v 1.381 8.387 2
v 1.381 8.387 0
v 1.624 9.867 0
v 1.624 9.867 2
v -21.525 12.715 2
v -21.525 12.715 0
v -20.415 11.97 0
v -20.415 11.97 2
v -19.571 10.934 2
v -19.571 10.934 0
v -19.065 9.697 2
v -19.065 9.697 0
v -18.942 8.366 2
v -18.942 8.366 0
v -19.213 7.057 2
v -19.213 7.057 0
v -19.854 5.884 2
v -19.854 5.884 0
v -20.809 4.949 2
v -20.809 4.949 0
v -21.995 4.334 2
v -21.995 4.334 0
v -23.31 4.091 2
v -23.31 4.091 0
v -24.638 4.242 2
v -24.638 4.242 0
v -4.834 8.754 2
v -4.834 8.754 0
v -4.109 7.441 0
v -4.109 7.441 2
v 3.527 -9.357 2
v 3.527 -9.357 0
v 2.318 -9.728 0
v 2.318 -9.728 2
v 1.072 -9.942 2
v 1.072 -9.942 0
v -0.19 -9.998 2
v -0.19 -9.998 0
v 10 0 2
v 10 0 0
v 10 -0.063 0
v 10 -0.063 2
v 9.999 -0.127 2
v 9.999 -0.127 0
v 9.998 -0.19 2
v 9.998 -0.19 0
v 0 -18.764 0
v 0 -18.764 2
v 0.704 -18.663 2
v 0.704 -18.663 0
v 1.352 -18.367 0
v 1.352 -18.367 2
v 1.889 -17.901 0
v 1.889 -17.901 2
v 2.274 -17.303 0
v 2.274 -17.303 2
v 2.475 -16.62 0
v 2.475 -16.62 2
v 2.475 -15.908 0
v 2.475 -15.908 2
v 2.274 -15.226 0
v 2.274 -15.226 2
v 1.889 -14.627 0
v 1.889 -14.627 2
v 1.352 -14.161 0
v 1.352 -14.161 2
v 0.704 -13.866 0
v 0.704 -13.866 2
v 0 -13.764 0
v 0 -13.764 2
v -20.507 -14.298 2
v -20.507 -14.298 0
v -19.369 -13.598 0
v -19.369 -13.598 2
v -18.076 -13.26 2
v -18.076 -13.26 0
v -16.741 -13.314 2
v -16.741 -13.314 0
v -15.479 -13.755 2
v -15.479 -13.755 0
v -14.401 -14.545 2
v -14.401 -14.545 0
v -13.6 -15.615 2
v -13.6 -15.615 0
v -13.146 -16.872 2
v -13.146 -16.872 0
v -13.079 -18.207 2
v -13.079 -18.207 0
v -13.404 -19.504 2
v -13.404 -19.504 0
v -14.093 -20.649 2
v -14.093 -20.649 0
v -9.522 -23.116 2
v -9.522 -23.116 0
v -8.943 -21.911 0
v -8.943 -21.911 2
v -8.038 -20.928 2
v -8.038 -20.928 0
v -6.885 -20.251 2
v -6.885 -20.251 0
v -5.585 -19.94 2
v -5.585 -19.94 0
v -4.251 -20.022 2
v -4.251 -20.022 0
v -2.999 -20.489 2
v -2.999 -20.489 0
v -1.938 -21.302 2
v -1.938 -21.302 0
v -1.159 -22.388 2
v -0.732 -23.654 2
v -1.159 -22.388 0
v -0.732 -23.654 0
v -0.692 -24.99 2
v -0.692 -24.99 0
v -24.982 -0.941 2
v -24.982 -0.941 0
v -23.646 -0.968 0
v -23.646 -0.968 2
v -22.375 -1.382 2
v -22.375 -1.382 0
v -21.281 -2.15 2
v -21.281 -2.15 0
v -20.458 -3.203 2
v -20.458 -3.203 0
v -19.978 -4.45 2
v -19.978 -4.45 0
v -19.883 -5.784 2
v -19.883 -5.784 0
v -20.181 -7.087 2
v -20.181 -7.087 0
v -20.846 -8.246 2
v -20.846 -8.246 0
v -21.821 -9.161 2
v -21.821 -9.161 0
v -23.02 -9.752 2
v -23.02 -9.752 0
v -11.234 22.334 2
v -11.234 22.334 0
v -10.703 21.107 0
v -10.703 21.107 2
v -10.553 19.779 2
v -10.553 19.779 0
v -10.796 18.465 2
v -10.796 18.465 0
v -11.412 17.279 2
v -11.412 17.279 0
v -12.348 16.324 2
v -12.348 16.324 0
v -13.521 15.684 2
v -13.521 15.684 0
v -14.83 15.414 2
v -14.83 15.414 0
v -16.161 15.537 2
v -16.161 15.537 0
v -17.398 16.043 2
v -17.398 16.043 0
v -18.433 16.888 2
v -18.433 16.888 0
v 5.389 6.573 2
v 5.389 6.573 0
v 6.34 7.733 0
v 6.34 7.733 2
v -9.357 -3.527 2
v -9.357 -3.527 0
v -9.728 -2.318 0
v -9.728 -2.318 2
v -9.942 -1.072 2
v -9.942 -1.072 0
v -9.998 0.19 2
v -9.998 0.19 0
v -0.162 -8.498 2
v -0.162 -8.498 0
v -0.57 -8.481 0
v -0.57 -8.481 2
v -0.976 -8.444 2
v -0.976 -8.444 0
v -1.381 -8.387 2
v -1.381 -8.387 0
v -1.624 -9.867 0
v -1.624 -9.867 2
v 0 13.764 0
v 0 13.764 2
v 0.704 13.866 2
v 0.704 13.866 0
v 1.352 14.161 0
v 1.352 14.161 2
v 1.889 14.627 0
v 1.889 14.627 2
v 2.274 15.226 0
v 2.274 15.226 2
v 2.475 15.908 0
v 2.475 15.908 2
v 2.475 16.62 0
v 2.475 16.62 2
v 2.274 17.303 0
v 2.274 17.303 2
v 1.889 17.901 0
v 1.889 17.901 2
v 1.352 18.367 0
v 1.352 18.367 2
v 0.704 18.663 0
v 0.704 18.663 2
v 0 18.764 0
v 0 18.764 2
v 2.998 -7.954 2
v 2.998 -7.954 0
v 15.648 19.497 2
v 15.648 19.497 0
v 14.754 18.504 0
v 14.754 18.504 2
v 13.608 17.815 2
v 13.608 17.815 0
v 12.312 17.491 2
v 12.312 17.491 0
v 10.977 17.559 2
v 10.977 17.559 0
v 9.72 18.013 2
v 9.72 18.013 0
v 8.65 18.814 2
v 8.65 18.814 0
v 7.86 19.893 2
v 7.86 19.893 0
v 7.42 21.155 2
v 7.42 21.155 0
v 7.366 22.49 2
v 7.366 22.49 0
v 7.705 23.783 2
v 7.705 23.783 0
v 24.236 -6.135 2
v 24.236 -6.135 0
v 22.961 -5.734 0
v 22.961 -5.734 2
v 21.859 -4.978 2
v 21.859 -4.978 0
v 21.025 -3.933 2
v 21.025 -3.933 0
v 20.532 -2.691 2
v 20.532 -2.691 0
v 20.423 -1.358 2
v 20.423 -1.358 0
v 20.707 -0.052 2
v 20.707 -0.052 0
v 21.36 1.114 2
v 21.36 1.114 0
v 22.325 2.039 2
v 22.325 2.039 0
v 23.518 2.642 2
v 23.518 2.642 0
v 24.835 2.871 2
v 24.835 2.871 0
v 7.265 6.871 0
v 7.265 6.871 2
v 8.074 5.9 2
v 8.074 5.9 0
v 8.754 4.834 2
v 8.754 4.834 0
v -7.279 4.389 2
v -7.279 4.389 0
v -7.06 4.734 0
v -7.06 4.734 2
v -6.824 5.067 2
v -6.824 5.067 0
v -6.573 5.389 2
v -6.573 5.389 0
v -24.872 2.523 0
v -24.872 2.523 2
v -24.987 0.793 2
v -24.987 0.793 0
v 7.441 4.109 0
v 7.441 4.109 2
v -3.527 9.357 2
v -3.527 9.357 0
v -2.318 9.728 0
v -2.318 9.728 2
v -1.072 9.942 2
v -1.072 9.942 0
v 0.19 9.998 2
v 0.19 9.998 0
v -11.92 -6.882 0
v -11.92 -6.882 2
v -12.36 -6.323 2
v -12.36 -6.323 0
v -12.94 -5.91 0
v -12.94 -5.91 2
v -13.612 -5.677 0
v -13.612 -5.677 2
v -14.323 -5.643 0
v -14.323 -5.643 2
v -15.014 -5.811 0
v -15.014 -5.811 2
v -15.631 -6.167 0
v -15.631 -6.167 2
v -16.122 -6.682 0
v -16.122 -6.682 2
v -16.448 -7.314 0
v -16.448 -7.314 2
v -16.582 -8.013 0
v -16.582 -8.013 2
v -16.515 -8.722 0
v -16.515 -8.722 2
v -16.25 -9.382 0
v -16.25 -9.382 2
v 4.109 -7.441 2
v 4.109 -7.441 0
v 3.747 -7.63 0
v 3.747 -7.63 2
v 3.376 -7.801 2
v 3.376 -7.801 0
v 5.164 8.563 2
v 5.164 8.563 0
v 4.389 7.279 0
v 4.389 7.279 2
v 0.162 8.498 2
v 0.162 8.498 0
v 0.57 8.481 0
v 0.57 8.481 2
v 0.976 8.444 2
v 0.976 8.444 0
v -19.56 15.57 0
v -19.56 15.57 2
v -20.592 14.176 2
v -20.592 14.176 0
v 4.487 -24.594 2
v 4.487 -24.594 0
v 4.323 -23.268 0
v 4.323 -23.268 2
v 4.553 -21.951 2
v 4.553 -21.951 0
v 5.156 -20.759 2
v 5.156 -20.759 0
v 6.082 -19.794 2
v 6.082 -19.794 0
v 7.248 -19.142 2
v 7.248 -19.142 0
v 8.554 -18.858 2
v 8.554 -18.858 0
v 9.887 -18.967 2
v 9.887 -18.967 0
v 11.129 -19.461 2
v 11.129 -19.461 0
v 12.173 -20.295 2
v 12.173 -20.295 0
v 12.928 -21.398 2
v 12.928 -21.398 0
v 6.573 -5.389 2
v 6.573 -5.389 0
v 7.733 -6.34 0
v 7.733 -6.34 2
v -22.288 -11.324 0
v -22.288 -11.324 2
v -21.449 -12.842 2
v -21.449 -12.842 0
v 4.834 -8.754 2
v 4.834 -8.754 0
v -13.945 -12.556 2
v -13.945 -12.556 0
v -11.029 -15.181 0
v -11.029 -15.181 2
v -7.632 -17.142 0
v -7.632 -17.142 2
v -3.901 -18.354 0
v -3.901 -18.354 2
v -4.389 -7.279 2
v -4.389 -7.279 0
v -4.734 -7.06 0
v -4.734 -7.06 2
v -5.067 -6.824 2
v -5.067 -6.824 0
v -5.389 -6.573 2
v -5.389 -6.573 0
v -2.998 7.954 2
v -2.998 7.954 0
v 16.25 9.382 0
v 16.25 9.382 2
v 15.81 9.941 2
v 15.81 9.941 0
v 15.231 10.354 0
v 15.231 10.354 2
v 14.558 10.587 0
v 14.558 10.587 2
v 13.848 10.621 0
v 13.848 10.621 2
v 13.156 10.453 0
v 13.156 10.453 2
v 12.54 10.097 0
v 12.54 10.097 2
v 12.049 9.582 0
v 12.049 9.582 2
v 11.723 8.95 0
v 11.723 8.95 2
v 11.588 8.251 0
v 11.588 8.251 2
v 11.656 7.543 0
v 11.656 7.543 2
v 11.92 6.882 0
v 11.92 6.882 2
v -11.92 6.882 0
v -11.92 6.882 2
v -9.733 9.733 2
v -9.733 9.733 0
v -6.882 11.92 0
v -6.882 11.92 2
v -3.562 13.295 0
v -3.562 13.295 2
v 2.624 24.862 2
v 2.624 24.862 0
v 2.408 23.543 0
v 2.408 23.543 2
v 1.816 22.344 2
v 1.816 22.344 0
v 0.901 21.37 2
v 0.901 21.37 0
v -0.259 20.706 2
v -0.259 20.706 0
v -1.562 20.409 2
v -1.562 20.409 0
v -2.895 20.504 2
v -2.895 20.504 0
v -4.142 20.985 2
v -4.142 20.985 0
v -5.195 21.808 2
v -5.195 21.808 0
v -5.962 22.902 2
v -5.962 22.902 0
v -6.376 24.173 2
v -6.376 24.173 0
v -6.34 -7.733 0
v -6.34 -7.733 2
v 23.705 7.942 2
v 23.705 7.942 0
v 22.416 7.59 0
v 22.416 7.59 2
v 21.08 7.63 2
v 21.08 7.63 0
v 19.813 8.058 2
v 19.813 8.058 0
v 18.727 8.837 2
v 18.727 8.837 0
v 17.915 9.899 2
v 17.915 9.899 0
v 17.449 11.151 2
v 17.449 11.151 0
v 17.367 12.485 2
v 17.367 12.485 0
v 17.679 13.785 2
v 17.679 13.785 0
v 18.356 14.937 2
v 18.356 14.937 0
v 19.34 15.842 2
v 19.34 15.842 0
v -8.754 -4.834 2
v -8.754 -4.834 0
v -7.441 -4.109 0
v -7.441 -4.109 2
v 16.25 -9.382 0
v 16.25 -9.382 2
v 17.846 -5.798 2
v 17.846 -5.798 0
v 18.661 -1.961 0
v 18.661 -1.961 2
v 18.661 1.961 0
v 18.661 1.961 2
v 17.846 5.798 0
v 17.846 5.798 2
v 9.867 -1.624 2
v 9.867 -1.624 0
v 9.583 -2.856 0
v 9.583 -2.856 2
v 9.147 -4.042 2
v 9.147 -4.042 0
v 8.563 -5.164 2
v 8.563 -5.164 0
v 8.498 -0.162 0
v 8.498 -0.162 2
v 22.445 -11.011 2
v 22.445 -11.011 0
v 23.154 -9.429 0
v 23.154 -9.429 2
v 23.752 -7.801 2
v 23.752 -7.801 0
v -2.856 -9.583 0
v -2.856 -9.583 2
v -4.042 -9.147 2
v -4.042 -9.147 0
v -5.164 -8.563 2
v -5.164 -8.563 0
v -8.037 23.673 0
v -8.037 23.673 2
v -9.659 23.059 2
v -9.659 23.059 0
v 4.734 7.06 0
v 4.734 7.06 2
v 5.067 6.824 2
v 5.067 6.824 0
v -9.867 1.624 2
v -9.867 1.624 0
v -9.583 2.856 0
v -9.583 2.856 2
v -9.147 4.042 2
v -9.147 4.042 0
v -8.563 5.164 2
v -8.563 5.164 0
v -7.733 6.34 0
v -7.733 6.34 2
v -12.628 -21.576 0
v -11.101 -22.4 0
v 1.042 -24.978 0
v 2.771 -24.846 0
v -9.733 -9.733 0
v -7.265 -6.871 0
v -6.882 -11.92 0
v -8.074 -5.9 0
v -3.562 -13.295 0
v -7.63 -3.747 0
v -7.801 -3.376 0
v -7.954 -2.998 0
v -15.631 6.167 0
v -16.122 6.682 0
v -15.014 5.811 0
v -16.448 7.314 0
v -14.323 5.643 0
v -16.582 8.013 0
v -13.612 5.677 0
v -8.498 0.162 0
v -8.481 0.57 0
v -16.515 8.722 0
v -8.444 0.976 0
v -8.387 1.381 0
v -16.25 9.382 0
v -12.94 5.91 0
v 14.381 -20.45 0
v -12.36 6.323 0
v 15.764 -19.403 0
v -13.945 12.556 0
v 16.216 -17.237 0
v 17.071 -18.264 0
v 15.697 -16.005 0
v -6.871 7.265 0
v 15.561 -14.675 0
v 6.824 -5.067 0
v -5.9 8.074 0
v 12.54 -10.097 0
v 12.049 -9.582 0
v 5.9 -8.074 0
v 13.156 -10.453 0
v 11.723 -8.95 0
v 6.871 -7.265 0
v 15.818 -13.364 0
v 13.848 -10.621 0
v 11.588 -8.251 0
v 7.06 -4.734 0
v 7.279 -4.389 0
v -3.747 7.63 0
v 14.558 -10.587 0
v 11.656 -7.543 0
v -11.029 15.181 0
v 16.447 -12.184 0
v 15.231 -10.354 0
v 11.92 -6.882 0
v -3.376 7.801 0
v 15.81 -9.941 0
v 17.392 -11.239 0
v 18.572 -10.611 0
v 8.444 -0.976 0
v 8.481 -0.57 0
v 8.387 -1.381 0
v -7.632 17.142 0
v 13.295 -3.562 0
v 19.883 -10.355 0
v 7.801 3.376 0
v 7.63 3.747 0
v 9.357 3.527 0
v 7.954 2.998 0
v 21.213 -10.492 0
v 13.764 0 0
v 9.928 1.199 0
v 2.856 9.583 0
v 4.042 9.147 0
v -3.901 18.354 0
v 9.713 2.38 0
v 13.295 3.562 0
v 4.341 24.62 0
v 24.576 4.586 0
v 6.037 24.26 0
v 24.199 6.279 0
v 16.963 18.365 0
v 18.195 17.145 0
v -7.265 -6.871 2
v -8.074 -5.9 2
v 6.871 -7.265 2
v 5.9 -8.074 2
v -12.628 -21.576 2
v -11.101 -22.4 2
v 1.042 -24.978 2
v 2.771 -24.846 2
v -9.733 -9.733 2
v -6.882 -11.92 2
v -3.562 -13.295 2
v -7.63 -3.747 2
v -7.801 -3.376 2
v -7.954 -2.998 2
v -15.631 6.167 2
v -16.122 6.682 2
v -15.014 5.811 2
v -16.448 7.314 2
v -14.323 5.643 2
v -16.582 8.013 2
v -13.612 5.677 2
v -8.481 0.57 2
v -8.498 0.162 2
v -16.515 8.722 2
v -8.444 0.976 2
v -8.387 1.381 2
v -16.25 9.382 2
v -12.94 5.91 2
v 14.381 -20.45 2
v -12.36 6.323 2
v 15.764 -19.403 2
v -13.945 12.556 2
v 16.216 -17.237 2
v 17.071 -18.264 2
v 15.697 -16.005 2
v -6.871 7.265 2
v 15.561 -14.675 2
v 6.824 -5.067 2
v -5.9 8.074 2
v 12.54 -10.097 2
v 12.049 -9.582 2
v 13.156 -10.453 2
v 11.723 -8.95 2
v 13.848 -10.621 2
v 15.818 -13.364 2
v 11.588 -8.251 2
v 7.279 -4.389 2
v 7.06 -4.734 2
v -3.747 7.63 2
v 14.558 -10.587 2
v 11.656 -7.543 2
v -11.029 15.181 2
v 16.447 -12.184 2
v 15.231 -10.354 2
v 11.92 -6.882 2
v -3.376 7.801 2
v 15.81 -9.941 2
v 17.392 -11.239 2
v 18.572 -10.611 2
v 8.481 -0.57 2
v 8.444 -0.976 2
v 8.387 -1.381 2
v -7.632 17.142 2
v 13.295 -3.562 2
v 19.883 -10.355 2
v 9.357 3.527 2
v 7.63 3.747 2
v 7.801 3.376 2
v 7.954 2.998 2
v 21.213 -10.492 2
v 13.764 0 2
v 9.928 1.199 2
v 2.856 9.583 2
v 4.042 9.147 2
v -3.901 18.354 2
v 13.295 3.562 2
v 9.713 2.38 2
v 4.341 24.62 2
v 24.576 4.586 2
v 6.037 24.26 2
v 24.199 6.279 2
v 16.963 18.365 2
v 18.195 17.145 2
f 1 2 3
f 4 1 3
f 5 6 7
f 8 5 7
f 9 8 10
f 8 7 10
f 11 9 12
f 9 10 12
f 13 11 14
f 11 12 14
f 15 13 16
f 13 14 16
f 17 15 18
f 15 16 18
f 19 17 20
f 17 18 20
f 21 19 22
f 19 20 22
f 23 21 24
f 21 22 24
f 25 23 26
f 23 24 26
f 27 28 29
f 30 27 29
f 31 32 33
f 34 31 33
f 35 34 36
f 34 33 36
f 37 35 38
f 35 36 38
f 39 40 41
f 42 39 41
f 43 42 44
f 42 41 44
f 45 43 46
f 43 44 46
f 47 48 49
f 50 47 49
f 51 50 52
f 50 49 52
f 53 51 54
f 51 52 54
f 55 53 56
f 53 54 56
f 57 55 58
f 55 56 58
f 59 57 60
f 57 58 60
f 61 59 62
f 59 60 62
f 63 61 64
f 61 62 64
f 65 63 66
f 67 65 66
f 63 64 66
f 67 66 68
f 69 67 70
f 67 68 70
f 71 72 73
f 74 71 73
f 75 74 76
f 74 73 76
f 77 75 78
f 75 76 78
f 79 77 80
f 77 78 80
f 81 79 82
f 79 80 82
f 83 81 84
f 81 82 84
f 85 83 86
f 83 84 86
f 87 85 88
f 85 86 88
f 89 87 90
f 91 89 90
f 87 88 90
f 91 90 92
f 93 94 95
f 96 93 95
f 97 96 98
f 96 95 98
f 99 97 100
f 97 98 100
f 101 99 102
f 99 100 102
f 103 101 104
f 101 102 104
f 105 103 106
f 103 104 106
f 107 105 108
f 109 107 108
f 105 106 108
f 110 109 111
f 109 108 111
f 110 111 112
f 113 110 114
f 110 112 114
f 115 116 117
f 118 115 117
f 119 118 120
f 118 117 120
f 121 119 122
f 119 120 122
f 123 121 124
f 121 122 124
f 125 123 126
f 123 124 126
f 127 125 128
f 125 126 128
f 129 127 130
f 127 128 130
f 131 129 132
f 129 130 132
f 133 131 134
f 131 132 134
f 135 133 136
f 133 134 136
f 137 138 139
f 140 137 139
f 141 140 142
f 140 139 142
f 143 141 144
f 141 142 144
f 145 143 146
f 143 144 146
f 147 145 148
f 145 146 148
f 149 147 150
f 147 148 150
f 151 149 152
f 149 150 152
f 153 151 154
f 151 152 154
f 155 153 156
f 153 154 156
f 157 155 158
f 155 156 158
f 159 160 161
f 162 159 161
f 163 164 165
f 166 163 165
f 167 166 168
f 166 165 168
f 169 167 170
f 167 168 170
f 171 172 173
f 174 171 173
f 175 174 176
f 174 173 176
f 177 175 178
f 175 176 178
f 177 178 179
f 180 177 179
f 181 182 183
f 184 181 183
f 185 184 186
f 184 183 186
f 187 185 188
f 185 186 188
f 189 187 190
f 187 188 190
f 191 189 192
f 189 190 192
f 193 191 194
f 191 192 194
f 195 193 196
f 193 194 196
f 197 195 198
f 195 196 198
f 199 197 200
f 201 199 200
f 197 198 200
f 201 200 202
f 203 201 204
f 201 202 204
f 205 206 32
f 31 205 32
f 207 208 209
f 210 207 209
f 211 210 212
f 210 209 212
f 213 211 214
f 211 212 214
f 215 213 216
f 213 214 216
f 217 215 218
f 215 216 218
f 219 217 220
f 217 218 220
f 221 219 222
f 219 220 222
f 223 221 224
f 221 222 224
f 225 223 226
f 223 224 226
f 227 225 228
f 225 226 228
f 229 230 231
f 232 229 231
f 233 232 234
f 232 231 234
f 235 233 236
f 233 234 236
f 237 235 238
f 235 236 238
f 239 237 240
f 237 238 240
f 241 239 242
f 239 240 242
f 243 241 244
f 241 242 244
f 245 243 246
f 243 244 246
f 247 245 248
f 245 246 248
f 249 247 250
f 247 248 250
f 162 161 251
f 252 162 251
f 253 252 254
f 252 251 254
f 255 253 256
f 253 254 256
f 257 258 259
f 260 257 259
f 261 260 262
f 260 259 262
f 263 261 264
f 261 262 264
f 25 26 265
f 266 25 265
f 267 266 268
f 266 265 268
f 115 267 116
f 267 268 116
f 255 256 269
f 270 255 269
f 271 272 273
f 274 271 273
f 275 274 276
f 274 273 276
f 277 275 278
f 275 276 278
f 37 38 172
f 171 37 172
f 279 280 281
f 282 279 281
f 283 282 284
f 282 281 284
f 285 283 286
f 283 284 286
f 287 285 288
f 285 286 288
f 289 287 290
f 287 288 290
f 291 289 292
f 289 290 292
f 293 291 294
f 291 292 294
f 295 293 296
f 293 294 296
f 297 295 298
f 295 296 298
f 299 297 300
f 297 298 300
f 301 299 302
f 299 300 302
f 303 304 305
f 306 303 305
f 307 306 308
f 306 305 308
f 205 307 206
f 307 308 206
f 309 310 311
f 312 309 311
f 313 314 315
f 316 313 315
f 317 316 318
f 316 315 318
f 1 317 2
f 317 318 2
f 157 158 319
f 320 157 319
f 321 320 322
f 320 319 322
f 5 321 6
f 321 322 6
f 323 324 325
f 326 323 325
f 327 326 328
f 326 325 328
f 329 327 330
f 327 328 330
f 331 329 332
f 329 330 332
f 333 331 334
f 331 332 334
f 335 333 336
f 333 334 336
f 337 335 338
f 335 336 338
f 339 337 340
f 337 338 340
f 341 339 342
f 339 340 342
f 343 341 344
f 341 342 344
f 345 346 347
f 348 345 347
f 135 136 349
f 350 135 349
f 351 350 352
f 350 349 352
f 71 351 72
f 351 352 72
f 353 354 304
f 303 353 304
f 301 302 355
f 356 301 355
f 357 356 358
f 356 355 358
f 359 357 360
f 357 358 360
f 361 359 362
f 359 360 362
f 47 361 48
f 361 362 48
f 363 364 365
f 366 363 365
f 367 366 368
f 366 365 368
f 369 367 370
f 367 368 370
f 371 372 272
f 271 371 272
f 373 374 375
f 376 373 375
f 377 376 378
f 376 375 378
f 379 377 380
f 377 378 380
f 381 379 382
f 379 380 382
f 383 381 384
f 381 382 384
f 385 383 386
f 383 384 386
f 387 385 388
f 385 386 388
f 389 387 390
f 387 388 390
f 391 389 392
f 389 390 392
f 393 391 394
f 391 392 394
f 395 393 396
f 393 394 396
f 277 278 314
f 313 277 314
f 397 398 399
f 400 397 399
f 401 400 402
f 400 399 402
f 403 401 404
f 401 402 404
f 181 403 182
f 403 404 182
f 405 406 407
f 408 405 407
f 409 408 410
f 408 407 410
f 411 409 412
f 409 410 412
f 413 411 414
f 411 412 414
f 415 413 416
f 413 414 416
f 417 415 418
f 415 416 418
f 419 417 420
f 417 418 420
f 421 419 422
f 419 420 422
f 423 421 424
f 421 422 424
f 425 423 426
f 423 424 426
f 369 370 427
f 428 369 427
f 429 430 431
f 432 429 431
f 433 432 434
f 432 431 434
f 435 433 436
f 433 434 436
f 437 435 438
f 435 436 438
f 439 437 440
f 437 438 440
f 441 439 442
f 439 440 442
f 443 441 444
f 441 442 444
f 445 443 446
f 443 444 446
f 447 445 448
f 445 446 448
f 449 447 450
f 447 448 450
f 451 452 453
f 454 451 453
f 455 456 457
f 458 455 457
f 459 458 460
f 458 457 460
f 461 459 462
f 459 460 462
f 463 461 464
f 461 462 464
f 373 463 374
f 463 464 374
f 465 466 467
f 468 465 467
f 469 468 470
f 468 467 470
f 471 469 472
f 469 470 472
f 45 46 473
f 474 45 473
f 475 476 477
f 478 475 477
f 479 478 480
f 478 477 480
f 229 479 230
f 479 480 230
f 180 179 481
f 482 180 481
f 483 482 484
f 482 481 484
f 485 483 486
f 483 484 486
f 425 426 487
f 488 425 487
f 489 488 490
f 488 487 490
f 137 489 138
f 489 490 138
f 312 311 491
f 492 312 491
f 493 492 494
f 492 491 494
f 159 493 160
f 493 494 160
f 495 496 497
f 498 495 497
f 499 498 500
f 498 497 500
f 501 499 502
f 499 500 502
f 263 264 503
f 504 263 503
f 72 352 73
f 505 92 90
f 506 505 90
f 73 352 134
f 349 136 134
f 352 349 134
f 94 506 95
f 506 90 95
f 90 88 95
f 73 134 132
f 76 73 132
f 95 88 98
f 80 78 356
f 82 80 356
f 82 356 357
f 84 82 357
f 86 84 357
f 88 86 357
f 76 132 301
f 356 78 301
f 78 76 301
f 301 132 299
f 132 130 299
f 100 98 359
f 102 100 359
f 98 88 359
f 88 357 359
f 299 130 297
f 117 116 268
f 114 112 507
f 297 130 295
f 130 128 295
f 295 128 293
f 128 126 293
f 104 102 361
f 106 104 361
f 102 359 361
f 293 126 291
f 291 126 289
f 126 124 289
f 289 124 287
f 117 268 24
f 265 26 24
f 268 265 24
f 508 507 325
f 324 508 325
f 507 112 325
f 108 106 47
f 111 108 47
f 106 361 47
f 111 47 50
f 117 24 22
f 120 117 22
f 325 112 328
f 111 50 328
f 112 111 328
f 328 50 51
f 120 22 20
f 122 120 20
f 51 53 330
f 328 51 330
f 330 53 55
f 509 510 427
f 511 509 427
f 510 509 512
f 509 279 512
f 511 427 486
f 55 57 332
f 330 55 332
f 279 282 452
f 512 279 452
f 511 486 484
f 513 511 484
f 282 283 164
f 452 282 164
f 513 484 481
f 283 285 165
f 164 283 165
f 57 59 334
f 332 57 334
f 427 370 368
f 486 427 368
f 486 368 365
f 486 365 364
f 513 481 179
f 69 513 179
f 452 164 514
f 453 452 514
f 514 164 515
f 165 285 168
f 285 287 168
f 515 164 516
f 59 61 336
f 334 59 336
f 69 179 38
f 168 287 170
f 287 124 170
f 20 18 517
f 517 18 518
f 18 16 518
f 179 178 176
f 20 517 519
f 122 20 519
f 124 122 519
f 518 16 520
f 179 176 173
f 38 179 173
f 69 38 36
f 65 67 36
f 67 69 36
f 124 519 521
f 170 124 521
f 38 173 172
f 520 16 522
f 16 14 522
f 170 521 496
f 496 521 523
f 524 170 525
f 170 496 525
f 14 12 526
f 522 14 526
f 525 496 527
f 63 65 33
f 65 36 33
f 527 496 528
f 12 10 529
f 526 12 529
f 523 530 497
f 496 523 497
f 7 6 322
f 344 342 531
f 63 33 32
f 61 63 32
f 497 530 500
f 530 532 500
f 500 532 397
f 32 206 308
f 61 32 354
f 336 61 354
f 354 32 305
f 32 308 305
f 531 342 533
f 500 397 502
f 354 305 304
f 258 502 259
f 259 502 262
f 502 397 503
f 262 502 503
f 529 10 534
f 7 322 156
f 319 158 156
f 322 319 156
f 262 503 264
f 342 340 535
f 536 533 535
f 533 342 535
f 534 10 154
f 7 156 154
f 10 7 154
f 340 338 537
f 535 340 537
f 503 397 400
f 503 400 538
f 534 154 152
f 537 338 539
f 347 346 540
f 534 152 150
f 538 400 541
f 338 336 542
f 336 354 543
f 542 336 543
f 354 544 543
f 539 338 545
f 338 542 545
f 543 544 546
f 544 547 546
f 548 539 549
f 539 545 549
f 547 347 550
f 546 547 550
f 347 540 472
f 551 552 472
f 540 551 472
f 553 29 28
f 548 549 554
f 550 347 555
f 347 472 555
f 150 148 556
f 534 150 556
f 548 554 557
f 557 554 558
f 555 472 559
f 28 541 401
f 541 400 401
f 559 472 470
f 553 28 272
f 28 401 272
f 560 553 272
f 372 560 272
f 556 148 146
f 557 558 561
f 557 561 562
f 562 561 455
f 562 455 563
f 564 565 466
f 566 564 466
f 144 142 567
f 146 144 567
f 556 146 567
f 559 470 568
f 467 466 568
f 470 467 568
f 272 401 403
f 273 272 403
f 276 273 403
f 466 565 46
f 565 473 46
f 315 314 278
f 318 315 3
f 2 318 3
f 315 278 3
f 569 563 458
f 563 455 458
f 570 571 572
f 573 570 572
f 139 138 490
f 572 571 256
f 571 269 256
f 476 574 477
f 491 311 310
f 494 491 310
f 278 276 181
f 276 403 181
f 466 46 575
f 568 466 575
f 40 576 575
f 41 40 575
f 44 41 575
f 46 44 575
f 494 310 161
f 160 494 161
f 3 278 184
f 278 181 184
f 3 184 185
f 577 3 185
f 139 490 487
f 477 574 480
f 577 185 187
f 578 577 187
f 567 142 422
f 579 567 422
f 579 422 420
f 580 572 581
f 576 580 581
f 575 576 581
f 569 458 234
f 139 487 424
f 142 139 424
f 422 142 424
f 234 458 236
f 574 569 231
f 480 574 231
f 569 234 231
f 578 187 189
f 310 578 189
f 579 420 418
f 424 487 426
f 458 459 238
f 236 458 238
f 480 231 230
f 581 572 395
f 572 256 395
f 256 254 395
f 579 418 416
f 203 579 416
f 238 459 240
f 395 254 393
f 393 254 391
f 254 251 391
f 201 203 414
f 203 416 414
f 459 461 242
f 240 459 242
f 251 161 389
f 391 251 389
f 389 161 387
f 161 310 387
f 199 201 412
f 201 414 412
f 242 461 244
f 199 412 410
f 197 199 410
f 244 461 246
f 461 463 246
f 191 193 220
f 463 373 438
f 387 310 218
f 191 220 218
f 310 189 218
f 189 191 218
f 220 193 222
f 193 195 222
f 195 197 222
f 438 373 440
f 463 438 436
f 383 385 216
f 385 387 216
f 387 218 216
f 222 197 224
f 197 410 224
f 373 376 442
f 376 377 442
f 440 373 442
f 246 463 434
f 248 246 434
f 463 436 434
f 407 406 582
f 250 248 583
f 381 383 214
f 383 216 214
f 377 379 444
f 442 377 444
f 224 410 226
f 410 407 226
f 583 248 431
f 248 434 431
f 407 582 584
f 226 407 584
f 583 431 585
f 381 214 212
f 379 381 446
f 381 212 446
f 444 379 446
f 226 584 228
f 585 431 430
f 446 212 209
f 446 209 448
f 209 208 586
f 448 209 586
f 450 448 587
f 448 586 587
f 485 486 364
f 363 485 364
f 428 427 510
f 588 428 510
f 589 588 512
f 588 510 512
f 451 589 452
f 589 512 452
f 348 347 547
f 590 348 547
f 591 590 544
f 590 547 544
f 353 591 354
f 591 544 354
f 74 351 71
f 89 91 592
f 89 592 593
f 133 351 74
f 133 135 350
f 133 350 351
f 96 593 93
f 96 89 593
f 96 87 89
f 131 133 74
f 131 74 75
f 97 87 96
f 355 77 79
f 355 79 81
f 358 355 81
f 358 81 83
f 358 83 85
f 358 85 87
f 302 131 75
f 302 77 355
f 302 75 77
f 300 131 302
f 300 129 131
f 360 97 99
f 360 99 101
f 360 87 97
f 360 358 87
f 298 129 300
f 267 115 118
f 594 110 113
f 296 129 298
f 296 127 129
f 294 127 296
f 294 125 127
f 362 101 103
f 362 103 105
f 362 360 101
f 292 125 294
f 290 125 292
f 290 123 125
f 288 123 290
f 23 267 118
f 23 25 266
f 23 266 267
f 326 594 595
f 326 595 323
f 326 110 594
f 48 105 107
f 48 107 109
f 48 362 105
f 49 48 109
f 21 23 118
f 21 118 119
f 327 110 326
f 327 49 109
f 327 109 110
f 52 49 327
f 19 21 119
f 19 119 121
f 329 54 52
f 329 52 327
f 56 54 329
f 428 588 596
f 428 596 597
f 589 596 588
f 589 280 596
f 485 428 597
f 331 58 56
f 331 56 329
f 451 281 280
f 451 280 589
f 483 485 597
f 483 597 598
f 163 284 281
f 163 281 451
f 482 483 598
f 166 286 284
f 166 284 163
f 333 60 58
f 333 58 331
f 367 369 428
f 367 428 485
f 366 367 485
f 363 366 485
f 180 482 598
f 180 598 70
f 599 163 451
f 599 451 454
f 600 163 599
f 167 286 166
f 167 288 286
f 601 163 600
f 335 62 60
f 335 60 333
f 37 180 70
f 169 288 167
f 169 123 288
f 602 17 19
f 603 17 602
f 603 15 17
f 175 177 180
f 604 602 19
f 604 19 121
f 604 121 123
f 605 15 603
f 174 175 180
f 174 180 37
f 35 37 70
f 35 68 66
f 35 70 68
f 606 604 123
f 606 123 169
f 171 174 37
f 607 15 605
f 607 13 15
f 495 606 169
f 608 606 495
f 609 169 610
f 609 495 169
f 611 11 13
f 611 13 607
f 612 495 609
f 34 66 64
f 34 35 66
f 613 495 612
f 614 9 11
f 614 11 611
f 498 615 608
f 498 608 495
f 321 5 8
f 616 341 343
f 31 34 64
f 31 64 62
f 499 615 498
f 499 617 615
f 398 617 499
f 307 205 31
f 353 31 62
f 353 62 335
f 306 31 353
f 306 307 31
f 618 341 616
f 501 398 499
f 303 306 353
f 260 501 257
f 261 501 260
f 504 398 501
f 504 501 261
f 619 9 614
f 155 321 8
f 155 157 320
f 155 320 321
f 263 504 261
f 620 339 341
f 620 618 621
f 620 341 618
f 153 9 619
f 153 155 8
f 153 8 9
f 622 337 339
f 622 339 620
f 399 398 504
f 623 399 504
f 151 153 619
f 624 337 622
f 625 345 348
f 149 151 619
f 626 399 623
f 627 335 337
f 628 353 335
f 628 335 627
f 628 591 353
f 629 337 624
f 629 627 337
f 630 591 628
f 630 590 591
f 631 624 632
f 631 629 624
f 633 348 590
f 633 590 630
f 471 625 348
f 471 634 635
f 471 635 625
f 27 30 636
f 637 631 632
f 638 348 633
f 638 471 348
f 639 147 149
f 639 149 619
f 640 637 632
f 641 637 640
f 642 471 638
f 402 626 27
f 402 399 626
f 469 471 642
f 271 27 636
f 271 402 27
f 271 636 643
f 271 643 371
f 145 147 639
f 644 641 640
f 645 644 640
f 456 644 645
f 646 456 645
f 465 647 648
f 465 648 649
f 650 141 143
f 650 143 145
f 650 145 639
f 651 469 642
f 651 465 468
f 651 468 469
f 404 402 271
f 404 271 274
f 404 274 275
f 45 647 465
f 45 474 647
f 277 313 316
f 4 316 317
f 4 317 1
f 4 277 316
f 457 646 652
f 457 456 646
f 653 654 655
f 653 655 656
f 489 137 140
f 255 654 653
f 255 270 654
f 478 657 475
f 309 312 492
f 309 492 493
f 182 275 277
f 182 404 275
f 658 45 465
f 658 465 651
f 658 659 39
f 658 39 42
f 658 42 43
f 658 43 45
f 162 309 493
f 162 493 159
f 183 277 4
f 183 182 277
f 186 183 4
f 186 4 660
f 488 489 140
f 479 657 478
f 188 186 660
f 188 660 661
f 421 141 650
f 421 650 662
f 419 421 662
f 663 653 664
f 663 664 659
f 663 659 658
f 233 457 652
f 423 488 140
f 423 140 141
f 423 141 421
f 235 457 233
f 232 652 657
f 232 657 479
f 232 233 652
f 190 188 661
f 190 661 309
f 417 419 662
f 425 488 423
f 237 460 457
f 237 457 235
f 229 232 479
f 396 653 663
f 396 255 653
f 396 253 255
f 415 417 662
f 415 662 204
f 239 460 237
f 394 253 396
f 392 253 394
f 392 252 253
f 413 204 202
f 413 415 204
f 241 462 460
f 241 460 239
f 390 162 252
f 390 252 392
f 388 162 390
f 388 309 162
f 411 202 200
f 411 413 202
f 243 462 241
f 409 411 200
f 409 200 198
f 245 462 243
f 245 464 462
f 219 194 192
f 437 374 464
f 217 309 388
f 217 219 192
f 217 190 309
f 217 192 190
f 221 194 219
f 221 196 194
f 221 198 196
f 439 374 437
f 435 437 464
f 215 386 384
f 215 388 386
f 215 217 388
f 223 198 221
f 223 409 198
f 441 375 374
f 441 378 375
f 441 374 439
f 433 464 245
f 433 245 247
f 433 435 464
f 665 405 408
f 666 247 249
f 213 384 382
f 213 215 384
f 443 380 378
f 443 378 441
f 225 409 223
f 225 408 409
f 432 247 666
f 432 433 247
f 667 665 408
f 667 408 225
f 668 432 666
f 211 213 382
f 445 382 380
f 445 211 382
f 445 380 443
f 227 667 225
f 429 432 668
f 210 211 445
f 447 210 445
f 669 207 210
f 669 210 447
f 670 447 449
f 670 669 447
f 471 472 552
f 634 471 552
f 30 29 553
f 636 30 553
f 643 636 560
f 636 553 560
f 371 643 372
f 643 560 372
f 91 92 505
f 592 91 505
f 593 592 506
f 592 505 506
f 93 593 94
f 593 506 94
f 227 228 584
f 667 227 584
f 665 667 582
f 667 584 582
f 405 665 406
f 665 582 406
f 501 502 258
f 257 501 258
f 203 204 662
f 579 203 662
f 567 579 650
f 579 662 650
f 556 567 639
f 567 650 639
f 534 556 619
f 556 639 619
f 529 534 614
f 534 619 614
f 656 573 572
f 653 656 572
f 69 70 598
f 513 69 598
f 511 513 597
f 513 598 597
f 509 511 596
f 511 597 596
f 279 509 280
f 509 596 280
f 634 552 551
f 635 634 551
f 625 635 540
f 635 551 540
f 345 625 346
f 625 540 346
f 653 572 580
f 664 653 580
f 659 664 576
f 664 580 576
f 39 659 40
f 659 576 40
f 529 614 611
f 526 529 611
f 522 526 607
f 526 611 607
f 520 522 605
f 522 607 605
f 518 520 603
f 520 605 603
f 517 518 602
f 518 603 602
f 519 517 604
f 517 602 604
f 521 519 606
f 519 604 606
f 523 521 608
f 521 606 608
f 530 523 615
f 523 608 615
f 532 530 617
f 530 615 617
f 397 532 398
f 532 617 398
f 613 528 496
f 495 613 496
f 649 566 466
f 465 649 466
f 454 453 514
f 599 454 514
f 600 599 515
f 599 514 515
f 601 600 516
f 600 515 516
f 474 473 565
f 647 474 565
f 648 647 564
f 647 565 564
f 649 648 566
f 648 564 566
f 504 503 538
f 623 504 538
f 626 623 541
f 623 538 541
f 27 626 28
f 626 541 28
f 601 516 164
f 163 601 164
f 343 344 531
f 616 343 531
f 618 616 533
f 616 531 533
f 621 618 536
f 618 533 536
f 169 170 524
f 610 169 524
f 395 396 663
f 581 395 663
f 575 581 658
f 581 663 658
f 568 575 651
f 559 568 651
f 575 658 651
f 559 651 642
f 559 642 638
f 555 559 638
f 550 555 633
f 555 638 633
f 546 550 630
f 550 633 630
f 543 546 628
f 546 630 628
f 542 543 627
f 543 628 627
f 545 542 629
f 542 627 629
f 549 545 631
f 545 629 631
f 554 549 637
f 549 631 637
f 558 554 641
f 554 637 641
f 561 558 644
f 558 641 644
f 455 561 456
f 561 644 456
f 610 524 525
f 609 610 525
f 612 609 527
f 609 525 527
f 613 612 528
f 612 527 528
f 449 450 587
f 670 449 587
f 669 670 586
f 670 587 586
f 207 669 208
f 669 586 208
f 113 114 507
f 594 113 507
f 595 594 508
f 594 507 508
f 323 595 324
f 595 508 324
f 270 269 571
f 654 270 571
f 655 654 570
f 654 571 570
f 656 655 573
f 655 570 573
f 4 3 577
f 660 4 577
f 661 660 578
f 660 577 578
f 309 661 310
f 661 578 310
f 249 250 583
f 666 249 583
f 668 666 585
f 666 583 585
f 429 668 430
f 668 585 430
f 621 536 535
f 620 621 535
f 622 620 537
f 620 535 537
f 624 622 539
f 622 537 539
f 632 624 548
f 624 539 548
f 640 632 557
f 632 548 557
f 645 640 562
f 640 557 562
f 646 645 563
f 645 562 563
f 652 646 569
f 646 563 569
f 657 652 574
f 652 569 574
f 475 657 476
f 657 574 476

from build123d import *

# Parameters (mm, degrees)
F1_DEPTH = 2
F2_DEPTH = 2
F4_DEPTH = 2


with BuildPart() as f1:
    # F0 (on Top) → F1 (new body)
    with BuildSketch(Plane.XY):
        with BuildLine():
            ThreePointArc((24.235519, -6.135113), (20.423062, -1.358402), (24.834565, 2.871307))
            ThreePointArc((24.834565, 2.871307), (24.40188, 5.435831), (23.705109, 7.941526))
            ThreePointArc((23.705109, 7.941526), (17.91538, 9.89878), (19.33982, 15.842076))
            ThreePointArc((19.33982, 15.842076), (17.589336, 17.765564), (15.648493, 19.496786))
            ThreePointArc((15.648493, 19.496786), (9.719693, 18.01317), (7.704819, 23.783098))
            ThreePointArc((7.704819, 23.783098), (5.192302, 24.454856), (2.623592, 24.861954))
            ThreePointArc((2.623592, 24.861954), (-1.561929, 20.408505), (-6.376408, 24.173155))
            ThreePointArc((-6.376408, 24.173155), (-8.853251, 23.379905), (-11.234281, 22.333628))
            ThreePointArc((-11.234281, 22.333628), (-12.347649, 16.324284), (-18.43317, 16.888406))
            ThreePointArc((-18.43317, 16.888406), (-20.08796, 14.881998), (-21.525349, 12.714532))
            ThreePointArc((-21.525349, 12.714532), (-19.213078, 7.057219), (-24.637531, 4.241707))
            ThreePointArc((-24.637531, 4.241707), (-24.944883, 1.659163), (-24.982271, -0.941337))
            ThreePointArc((-24.982271, -0.941337), (-19.97849, -4.450464), (-23.01965, -9.751704))
            ThreePointArc((-23.01965, -9.751704), (-21.881982, -12.090445), (-20.507499, -14.298339))
            ThreePointArc((-20.507499, -14.298339), (-14.400873, -14.545156), (-14.093192, -20.649018))
            ThreePointArc((-14.093192, -20.649018), (-11.871706, -22.001422), (-9.52174, -23.115719))
            ThreePointArc((-9.52174, -23.115719), (-4.25108, -20.021864), (-0.692246, -24.990414))
            ThreePointArc((-0.692246, -24.990414), (1.907752, -24.927103), (4.487104, -24.594022))
            ThreePointArc((4.487104, -24.594022), (7.2484, -19.141771), (12.928483, -21.397531))
            ThreePointArc((12.928483, -21.397531), (15.081513, -19.938605), (17.071324, -18.263896))
            ThreePointArc((17.071324, -18.263896), (16.446565, -12.184301), (22.444511, -11.011082))
            ThreePointArc((22.444511, -11.011082), (23.467, -8.619741), (24.235519, -6.135113))
        make_face()
        with BuildLine():
            ThreePointArc((9.357447, 3.52678), (9.83805, 1.792418), (10, 0))
            ThreePointArc((10, 0), (9.999547, -0.095211), (9.998187, -0.190414))
            ThreePointArc((9.998187, -0.190414), (9.958528, -0.909789), (9.867177, -1.624442))
            ThreePointArc((9.867177, -1.624442), (9.383729, -3.456246), (8.563477, -5.163997))
            ThreePointArc((8.563477, -5.163997), (8.169444, -5.767165), (7.733005, -6.340397))
            ThreePointArc((7.733005, -6.340397), (6.398425, -7.685061), (4.83419, -8.753891))
            ThreePointArc((4.83419, -8.753891), (4.191363, -9.079233), (3.52678, -9.357447))
            ThreePointArc((3.52678, -9.357447), (1.698668, -9.85467), (-0.190414, -9.998187))
            ThreePointArc((-0.190414, -9.998187), (-0.909789, -9.958528), (-1.624442, -9.867177))
            ThreePointArc((-1.624442, -9.867177), (-3.456246, -9.383729), (-5.163997, -8.563477))
            ThreePointArc((-5.163997, -8.563477), (-5.767165, -8.169444), (-6.340397, -7.733005))
            ThreePointArc((-6.340397, -7.733005), (-7.685061, -6.398425), (-8.753891, -4.83419))
            ThreePointArc((-8.753891, -4.83419), (-9.079233, -4.191363), (-9.357447, -3.52678))
            ThreePointArc((-9.357447, -3.52678), (-9.85467, -1.698668), (-9.998187, 0.190414))
            ThreePointArc((-9.998187, 0.190414), (-9.958528, 0.909789), (-9.867177, 1.624442))
            ThreePointArc((-9.867177, 1.624442), (-9.383729, 3.456246), (-8.563477, 5.163997))
            ThreePointArc((-8.563477, 5.163997), (-8.169444, 5.767165), (-7.733005, 6.340397))
            ThreePointArc((-7.733005, 6.340397), (-6.398425, 7.685061), (-4.83419, 8.753891))
            ThreePointArc((-4.83419, 8.753891), (-4.191363, 9.079233), (-3.52678, 9.357447))
            ThreePointArc((-3.52678, 9.357447), (-1.698668, 9.85467), (0.190414, 9.998187))
            ThreePointArc((0.190414, 9.998187), (0.909789, 9.958528), (1.624442, 9.867177))
            ThreePointArc((1.624442, 9.867177), (3.456246, 9.383729), (5.163997, 8.563477))
            ThreePointArc((5.163997, 8.563477), (5.767165, 8.169444), (6.340397, 7.733005))
            ThreePointArc((6.340397, 7.733005), (7.685061, 6.398425), (8.753891, 4.83419))
            ThreePointArc((8.753891, 4.83419), (9.079233, 4.191363), (9.357447, 3.52678))
        make_face(mode=Mode.SUBTRACT)
    extrude(amount=F1_DEPTH)

    # F0 (on Top) → F2 (join)
    with BuildSketch(Plane.XY):
        with BuildLine():
            Line((7.95383, 2.997763), (9.357447, 3.52678))
            ThreePointArc((9.357447, 3.52678), (9.079233, 4.191363), (8.753891, 4.83419))
            Line((8.753891, 4.83419), (7.440807, 4.109062))
            ThreePointArc((7.440807, 4.109062), (7.717348, 3.562659), (7.95383, 2.997763))
        make_face()
        with BuildLine():
            Line((5.389337, 6.573054), (6.340397, 7.733005))
            ThreePointArc((6.340397, 7.733005), (5.767165, 8.169444), (5.163997, 8.563477))
            Line((5.163997, 8.563477), (4.389397, 7.278955))
            ThreePointArc((4.389397, 7.278955), (4.90209, 6.944027), (5.389337, 6.573054))
        make_face()
        with BuildLine():
            Line((1.380776, 8.387101), (1.624442, 9.867177))
            ThreePointArc((1.624442, 9.867177), (0.909789, 9.958528), (0.190414, 9.998187))
            Line((0.190414, 9.998187), (0.161852, 8.498459))
            ThreePointArc((0.161852, 8.498459), (0.773321, 8.464749), (1.380776, 8.387101))
        make_face()
        with BuildLine():
            ThreePointArc((9.867177, -1.624442), (9.958528, -0.909789), (9.998187, -0.190414))
            Line((9.998187, -0.190414), (8.498459, -0.161852))
            ThreePointArc((8.498459, -0.161852), (8.464749, -0.773321), (8.387101, -1.380776))
            Line((8.387101, -1.380776), (9.867177, -1.624442))
        make_face()
        with BuildLine():
            ThreePointArc((7.733005, -6.340397), (8.169444, -5.767165), (8.563477, -5.163997))
            Line((8.563477, -5.163997), (7.278955, -4.389397))
            ThreePointArc((7.278955, -4.389397), (6.944027, -4.90209), (6.573054, -5.389337))
            Line((6.573054, -5.389337), (7.733005, -6.340397))
        make_face()
        with BuildLine():
            ThreePointArc((3.52678, -9.357447), (4.191363, -9.079233), (4.83419, -8.753891))
            Line((4.83419, -8.753891), (4.109062, -7.440807))
            ThreePointArc((4.109062, -7.440807), (3.562659, -7.717348), (2.997763, -7.95383))
            Line((2.997763, -7.95383), (3.52678, -9.357447))
        make_face()
        with BuildLine():
            ThreePointArc((-1.624442, -9.867177), (-0.909789, -9.958528), (-0.190414, -9.998187))
            Line((-0.190414, -9.998187), (-0.161852, -8.498459))
            ThreePointArc((-0.161852, -8.498459), (-0.773321, -8.464749), (-1.380776, -8.387101))
            Line((-1.380776, -8.387101), (-1.624442, -9.867177))
        make_face()
        with BuildLine():
            ThreePointArc((-6.340397, -7.733005), (-5.767165, -8.169444), (-5.163997, -8.563477))
            Line((-5.163997, -8.563477), (-4.389397, -7.278955))
            ThreePointArc((-4.389397, -7.278955), (-4.90209, -6.944027), (-5.389337, -6.573054))
            Line((-5.389337, -6.573054), (-6.340397, -7.733005))
        make_face()
        with BuildLine():
            ThreePointArc((-9.357447, -3.52678), (-9.079233, -4.191363), (-8.753891, -4.83419))
            Line((-8.753891, -4.83419), (-7.440807, -4.109062))
            ThreePointArc((-7.440807, -4.109062), (-7.717348, -3.562659), (-7.95383, -2.997763))
            Line((-7.95383, -2.997763), (-9.357447, -3.52678))
        make_face()
        with BuildLine():
            Line((-8.387101, 1.380776), (-9.867177, 1.624442))
            ThreePointArc((-9.867177, 1.624442), (-9.958528, 0.909789), (-9.998187, 0.190414))
            Line((-9.998187, 0.190414), (-8.498459, 0.161852))
            ThreePointArc((-8.498459, 0.161852), (-8.464749, 0.773321), (-8.387101, 1.380776))
        make_face()
        with BuildLine():
            Line((-6.573054, 5.389337), (-7.733005, 6.340397))
            ThreePointArc((-7.733005, 6.340397), (-8.169444, 5.767165), (-8.563477, 5.163997))
            Line((-8.563477, 5.163997), (-7.278955, 4.389397))
            ThreePointArc((-7.278955, 4.389397), (-6.944027, 4.90209), (-6.573054, 5.389337))
        make_face()
        with BuildLine():
            Line((-2.997763, 7.95383), (-3.52678, 9.357447))
            ThreePointArc((-3.52678, 9.357447), (-4.191363, 9.079233), (-4.83419, 8.753891))
            Line((-4.83419, 8.753891), (-4.109062, 7.440807))
            ThreePointArc((-4.109062, 7.440807), (-3.562659, 7.717348), (-2.997763, 7.95383))
        make_face()
    extrude(amount=F2_DEPTH)

    # F3 (on face) → F4 (cut)
    with BuildSketch(Plane.XY.offset(2)):
        with BuildLine():
            ThreePointArc((-11.920186, 6.882123), (-6.882123, 11.920186), (0, 13.764245))
            ThreePointArc((0, 13.764245), (2.5, 16.264245), (0, 18.764245))
            ThreePointArc((0, 18.764245), (-9.382123, 16.250313), (-16.250313, 9.382123))
            ThreePointArc((-16.250313, 9.382123), (-15.335249, 5.967059), (-11.920186, 6.882123))
        make_face()
        with BuildLine():
            ThreePointArc((0, -13.764245), (-6.882123, -11.920186), (-11.920186, -6.882123))
            ThreePointArc((-11.920186, -6.882123), (-15.335249, -5.967059), (-16.250313, -9.382123))
            ThreePointArc((-16.250313, -9.382123), (-9.382123, -16.250313), (0, -18.764245))
            ThreePointArc((0, -18.764245), (2.5, -16.264245), (0, -13.764245))
        make_face()
        with BuildLine():
            ThreePointArc((11.920186, 6.882123), (13.764245, 0), (11.920186, -6.882123))
            ThreePointArc((11.920186, -6.882123), (12.835249, -10.297186), (16.250313, -9.382123))
            ThreePointArc((16.250313, -9.382123), (18.764245, 0), (16.250313, 9.382123))
            ThreePointArc((16.250313, 9.382123), (12.835249, 10.297186), (11.920186, 6.882123))
        make_face()
    extrude(amount=-F4_DEPTH, mode=Mode.SUBTRACT)


solid = f1.part
